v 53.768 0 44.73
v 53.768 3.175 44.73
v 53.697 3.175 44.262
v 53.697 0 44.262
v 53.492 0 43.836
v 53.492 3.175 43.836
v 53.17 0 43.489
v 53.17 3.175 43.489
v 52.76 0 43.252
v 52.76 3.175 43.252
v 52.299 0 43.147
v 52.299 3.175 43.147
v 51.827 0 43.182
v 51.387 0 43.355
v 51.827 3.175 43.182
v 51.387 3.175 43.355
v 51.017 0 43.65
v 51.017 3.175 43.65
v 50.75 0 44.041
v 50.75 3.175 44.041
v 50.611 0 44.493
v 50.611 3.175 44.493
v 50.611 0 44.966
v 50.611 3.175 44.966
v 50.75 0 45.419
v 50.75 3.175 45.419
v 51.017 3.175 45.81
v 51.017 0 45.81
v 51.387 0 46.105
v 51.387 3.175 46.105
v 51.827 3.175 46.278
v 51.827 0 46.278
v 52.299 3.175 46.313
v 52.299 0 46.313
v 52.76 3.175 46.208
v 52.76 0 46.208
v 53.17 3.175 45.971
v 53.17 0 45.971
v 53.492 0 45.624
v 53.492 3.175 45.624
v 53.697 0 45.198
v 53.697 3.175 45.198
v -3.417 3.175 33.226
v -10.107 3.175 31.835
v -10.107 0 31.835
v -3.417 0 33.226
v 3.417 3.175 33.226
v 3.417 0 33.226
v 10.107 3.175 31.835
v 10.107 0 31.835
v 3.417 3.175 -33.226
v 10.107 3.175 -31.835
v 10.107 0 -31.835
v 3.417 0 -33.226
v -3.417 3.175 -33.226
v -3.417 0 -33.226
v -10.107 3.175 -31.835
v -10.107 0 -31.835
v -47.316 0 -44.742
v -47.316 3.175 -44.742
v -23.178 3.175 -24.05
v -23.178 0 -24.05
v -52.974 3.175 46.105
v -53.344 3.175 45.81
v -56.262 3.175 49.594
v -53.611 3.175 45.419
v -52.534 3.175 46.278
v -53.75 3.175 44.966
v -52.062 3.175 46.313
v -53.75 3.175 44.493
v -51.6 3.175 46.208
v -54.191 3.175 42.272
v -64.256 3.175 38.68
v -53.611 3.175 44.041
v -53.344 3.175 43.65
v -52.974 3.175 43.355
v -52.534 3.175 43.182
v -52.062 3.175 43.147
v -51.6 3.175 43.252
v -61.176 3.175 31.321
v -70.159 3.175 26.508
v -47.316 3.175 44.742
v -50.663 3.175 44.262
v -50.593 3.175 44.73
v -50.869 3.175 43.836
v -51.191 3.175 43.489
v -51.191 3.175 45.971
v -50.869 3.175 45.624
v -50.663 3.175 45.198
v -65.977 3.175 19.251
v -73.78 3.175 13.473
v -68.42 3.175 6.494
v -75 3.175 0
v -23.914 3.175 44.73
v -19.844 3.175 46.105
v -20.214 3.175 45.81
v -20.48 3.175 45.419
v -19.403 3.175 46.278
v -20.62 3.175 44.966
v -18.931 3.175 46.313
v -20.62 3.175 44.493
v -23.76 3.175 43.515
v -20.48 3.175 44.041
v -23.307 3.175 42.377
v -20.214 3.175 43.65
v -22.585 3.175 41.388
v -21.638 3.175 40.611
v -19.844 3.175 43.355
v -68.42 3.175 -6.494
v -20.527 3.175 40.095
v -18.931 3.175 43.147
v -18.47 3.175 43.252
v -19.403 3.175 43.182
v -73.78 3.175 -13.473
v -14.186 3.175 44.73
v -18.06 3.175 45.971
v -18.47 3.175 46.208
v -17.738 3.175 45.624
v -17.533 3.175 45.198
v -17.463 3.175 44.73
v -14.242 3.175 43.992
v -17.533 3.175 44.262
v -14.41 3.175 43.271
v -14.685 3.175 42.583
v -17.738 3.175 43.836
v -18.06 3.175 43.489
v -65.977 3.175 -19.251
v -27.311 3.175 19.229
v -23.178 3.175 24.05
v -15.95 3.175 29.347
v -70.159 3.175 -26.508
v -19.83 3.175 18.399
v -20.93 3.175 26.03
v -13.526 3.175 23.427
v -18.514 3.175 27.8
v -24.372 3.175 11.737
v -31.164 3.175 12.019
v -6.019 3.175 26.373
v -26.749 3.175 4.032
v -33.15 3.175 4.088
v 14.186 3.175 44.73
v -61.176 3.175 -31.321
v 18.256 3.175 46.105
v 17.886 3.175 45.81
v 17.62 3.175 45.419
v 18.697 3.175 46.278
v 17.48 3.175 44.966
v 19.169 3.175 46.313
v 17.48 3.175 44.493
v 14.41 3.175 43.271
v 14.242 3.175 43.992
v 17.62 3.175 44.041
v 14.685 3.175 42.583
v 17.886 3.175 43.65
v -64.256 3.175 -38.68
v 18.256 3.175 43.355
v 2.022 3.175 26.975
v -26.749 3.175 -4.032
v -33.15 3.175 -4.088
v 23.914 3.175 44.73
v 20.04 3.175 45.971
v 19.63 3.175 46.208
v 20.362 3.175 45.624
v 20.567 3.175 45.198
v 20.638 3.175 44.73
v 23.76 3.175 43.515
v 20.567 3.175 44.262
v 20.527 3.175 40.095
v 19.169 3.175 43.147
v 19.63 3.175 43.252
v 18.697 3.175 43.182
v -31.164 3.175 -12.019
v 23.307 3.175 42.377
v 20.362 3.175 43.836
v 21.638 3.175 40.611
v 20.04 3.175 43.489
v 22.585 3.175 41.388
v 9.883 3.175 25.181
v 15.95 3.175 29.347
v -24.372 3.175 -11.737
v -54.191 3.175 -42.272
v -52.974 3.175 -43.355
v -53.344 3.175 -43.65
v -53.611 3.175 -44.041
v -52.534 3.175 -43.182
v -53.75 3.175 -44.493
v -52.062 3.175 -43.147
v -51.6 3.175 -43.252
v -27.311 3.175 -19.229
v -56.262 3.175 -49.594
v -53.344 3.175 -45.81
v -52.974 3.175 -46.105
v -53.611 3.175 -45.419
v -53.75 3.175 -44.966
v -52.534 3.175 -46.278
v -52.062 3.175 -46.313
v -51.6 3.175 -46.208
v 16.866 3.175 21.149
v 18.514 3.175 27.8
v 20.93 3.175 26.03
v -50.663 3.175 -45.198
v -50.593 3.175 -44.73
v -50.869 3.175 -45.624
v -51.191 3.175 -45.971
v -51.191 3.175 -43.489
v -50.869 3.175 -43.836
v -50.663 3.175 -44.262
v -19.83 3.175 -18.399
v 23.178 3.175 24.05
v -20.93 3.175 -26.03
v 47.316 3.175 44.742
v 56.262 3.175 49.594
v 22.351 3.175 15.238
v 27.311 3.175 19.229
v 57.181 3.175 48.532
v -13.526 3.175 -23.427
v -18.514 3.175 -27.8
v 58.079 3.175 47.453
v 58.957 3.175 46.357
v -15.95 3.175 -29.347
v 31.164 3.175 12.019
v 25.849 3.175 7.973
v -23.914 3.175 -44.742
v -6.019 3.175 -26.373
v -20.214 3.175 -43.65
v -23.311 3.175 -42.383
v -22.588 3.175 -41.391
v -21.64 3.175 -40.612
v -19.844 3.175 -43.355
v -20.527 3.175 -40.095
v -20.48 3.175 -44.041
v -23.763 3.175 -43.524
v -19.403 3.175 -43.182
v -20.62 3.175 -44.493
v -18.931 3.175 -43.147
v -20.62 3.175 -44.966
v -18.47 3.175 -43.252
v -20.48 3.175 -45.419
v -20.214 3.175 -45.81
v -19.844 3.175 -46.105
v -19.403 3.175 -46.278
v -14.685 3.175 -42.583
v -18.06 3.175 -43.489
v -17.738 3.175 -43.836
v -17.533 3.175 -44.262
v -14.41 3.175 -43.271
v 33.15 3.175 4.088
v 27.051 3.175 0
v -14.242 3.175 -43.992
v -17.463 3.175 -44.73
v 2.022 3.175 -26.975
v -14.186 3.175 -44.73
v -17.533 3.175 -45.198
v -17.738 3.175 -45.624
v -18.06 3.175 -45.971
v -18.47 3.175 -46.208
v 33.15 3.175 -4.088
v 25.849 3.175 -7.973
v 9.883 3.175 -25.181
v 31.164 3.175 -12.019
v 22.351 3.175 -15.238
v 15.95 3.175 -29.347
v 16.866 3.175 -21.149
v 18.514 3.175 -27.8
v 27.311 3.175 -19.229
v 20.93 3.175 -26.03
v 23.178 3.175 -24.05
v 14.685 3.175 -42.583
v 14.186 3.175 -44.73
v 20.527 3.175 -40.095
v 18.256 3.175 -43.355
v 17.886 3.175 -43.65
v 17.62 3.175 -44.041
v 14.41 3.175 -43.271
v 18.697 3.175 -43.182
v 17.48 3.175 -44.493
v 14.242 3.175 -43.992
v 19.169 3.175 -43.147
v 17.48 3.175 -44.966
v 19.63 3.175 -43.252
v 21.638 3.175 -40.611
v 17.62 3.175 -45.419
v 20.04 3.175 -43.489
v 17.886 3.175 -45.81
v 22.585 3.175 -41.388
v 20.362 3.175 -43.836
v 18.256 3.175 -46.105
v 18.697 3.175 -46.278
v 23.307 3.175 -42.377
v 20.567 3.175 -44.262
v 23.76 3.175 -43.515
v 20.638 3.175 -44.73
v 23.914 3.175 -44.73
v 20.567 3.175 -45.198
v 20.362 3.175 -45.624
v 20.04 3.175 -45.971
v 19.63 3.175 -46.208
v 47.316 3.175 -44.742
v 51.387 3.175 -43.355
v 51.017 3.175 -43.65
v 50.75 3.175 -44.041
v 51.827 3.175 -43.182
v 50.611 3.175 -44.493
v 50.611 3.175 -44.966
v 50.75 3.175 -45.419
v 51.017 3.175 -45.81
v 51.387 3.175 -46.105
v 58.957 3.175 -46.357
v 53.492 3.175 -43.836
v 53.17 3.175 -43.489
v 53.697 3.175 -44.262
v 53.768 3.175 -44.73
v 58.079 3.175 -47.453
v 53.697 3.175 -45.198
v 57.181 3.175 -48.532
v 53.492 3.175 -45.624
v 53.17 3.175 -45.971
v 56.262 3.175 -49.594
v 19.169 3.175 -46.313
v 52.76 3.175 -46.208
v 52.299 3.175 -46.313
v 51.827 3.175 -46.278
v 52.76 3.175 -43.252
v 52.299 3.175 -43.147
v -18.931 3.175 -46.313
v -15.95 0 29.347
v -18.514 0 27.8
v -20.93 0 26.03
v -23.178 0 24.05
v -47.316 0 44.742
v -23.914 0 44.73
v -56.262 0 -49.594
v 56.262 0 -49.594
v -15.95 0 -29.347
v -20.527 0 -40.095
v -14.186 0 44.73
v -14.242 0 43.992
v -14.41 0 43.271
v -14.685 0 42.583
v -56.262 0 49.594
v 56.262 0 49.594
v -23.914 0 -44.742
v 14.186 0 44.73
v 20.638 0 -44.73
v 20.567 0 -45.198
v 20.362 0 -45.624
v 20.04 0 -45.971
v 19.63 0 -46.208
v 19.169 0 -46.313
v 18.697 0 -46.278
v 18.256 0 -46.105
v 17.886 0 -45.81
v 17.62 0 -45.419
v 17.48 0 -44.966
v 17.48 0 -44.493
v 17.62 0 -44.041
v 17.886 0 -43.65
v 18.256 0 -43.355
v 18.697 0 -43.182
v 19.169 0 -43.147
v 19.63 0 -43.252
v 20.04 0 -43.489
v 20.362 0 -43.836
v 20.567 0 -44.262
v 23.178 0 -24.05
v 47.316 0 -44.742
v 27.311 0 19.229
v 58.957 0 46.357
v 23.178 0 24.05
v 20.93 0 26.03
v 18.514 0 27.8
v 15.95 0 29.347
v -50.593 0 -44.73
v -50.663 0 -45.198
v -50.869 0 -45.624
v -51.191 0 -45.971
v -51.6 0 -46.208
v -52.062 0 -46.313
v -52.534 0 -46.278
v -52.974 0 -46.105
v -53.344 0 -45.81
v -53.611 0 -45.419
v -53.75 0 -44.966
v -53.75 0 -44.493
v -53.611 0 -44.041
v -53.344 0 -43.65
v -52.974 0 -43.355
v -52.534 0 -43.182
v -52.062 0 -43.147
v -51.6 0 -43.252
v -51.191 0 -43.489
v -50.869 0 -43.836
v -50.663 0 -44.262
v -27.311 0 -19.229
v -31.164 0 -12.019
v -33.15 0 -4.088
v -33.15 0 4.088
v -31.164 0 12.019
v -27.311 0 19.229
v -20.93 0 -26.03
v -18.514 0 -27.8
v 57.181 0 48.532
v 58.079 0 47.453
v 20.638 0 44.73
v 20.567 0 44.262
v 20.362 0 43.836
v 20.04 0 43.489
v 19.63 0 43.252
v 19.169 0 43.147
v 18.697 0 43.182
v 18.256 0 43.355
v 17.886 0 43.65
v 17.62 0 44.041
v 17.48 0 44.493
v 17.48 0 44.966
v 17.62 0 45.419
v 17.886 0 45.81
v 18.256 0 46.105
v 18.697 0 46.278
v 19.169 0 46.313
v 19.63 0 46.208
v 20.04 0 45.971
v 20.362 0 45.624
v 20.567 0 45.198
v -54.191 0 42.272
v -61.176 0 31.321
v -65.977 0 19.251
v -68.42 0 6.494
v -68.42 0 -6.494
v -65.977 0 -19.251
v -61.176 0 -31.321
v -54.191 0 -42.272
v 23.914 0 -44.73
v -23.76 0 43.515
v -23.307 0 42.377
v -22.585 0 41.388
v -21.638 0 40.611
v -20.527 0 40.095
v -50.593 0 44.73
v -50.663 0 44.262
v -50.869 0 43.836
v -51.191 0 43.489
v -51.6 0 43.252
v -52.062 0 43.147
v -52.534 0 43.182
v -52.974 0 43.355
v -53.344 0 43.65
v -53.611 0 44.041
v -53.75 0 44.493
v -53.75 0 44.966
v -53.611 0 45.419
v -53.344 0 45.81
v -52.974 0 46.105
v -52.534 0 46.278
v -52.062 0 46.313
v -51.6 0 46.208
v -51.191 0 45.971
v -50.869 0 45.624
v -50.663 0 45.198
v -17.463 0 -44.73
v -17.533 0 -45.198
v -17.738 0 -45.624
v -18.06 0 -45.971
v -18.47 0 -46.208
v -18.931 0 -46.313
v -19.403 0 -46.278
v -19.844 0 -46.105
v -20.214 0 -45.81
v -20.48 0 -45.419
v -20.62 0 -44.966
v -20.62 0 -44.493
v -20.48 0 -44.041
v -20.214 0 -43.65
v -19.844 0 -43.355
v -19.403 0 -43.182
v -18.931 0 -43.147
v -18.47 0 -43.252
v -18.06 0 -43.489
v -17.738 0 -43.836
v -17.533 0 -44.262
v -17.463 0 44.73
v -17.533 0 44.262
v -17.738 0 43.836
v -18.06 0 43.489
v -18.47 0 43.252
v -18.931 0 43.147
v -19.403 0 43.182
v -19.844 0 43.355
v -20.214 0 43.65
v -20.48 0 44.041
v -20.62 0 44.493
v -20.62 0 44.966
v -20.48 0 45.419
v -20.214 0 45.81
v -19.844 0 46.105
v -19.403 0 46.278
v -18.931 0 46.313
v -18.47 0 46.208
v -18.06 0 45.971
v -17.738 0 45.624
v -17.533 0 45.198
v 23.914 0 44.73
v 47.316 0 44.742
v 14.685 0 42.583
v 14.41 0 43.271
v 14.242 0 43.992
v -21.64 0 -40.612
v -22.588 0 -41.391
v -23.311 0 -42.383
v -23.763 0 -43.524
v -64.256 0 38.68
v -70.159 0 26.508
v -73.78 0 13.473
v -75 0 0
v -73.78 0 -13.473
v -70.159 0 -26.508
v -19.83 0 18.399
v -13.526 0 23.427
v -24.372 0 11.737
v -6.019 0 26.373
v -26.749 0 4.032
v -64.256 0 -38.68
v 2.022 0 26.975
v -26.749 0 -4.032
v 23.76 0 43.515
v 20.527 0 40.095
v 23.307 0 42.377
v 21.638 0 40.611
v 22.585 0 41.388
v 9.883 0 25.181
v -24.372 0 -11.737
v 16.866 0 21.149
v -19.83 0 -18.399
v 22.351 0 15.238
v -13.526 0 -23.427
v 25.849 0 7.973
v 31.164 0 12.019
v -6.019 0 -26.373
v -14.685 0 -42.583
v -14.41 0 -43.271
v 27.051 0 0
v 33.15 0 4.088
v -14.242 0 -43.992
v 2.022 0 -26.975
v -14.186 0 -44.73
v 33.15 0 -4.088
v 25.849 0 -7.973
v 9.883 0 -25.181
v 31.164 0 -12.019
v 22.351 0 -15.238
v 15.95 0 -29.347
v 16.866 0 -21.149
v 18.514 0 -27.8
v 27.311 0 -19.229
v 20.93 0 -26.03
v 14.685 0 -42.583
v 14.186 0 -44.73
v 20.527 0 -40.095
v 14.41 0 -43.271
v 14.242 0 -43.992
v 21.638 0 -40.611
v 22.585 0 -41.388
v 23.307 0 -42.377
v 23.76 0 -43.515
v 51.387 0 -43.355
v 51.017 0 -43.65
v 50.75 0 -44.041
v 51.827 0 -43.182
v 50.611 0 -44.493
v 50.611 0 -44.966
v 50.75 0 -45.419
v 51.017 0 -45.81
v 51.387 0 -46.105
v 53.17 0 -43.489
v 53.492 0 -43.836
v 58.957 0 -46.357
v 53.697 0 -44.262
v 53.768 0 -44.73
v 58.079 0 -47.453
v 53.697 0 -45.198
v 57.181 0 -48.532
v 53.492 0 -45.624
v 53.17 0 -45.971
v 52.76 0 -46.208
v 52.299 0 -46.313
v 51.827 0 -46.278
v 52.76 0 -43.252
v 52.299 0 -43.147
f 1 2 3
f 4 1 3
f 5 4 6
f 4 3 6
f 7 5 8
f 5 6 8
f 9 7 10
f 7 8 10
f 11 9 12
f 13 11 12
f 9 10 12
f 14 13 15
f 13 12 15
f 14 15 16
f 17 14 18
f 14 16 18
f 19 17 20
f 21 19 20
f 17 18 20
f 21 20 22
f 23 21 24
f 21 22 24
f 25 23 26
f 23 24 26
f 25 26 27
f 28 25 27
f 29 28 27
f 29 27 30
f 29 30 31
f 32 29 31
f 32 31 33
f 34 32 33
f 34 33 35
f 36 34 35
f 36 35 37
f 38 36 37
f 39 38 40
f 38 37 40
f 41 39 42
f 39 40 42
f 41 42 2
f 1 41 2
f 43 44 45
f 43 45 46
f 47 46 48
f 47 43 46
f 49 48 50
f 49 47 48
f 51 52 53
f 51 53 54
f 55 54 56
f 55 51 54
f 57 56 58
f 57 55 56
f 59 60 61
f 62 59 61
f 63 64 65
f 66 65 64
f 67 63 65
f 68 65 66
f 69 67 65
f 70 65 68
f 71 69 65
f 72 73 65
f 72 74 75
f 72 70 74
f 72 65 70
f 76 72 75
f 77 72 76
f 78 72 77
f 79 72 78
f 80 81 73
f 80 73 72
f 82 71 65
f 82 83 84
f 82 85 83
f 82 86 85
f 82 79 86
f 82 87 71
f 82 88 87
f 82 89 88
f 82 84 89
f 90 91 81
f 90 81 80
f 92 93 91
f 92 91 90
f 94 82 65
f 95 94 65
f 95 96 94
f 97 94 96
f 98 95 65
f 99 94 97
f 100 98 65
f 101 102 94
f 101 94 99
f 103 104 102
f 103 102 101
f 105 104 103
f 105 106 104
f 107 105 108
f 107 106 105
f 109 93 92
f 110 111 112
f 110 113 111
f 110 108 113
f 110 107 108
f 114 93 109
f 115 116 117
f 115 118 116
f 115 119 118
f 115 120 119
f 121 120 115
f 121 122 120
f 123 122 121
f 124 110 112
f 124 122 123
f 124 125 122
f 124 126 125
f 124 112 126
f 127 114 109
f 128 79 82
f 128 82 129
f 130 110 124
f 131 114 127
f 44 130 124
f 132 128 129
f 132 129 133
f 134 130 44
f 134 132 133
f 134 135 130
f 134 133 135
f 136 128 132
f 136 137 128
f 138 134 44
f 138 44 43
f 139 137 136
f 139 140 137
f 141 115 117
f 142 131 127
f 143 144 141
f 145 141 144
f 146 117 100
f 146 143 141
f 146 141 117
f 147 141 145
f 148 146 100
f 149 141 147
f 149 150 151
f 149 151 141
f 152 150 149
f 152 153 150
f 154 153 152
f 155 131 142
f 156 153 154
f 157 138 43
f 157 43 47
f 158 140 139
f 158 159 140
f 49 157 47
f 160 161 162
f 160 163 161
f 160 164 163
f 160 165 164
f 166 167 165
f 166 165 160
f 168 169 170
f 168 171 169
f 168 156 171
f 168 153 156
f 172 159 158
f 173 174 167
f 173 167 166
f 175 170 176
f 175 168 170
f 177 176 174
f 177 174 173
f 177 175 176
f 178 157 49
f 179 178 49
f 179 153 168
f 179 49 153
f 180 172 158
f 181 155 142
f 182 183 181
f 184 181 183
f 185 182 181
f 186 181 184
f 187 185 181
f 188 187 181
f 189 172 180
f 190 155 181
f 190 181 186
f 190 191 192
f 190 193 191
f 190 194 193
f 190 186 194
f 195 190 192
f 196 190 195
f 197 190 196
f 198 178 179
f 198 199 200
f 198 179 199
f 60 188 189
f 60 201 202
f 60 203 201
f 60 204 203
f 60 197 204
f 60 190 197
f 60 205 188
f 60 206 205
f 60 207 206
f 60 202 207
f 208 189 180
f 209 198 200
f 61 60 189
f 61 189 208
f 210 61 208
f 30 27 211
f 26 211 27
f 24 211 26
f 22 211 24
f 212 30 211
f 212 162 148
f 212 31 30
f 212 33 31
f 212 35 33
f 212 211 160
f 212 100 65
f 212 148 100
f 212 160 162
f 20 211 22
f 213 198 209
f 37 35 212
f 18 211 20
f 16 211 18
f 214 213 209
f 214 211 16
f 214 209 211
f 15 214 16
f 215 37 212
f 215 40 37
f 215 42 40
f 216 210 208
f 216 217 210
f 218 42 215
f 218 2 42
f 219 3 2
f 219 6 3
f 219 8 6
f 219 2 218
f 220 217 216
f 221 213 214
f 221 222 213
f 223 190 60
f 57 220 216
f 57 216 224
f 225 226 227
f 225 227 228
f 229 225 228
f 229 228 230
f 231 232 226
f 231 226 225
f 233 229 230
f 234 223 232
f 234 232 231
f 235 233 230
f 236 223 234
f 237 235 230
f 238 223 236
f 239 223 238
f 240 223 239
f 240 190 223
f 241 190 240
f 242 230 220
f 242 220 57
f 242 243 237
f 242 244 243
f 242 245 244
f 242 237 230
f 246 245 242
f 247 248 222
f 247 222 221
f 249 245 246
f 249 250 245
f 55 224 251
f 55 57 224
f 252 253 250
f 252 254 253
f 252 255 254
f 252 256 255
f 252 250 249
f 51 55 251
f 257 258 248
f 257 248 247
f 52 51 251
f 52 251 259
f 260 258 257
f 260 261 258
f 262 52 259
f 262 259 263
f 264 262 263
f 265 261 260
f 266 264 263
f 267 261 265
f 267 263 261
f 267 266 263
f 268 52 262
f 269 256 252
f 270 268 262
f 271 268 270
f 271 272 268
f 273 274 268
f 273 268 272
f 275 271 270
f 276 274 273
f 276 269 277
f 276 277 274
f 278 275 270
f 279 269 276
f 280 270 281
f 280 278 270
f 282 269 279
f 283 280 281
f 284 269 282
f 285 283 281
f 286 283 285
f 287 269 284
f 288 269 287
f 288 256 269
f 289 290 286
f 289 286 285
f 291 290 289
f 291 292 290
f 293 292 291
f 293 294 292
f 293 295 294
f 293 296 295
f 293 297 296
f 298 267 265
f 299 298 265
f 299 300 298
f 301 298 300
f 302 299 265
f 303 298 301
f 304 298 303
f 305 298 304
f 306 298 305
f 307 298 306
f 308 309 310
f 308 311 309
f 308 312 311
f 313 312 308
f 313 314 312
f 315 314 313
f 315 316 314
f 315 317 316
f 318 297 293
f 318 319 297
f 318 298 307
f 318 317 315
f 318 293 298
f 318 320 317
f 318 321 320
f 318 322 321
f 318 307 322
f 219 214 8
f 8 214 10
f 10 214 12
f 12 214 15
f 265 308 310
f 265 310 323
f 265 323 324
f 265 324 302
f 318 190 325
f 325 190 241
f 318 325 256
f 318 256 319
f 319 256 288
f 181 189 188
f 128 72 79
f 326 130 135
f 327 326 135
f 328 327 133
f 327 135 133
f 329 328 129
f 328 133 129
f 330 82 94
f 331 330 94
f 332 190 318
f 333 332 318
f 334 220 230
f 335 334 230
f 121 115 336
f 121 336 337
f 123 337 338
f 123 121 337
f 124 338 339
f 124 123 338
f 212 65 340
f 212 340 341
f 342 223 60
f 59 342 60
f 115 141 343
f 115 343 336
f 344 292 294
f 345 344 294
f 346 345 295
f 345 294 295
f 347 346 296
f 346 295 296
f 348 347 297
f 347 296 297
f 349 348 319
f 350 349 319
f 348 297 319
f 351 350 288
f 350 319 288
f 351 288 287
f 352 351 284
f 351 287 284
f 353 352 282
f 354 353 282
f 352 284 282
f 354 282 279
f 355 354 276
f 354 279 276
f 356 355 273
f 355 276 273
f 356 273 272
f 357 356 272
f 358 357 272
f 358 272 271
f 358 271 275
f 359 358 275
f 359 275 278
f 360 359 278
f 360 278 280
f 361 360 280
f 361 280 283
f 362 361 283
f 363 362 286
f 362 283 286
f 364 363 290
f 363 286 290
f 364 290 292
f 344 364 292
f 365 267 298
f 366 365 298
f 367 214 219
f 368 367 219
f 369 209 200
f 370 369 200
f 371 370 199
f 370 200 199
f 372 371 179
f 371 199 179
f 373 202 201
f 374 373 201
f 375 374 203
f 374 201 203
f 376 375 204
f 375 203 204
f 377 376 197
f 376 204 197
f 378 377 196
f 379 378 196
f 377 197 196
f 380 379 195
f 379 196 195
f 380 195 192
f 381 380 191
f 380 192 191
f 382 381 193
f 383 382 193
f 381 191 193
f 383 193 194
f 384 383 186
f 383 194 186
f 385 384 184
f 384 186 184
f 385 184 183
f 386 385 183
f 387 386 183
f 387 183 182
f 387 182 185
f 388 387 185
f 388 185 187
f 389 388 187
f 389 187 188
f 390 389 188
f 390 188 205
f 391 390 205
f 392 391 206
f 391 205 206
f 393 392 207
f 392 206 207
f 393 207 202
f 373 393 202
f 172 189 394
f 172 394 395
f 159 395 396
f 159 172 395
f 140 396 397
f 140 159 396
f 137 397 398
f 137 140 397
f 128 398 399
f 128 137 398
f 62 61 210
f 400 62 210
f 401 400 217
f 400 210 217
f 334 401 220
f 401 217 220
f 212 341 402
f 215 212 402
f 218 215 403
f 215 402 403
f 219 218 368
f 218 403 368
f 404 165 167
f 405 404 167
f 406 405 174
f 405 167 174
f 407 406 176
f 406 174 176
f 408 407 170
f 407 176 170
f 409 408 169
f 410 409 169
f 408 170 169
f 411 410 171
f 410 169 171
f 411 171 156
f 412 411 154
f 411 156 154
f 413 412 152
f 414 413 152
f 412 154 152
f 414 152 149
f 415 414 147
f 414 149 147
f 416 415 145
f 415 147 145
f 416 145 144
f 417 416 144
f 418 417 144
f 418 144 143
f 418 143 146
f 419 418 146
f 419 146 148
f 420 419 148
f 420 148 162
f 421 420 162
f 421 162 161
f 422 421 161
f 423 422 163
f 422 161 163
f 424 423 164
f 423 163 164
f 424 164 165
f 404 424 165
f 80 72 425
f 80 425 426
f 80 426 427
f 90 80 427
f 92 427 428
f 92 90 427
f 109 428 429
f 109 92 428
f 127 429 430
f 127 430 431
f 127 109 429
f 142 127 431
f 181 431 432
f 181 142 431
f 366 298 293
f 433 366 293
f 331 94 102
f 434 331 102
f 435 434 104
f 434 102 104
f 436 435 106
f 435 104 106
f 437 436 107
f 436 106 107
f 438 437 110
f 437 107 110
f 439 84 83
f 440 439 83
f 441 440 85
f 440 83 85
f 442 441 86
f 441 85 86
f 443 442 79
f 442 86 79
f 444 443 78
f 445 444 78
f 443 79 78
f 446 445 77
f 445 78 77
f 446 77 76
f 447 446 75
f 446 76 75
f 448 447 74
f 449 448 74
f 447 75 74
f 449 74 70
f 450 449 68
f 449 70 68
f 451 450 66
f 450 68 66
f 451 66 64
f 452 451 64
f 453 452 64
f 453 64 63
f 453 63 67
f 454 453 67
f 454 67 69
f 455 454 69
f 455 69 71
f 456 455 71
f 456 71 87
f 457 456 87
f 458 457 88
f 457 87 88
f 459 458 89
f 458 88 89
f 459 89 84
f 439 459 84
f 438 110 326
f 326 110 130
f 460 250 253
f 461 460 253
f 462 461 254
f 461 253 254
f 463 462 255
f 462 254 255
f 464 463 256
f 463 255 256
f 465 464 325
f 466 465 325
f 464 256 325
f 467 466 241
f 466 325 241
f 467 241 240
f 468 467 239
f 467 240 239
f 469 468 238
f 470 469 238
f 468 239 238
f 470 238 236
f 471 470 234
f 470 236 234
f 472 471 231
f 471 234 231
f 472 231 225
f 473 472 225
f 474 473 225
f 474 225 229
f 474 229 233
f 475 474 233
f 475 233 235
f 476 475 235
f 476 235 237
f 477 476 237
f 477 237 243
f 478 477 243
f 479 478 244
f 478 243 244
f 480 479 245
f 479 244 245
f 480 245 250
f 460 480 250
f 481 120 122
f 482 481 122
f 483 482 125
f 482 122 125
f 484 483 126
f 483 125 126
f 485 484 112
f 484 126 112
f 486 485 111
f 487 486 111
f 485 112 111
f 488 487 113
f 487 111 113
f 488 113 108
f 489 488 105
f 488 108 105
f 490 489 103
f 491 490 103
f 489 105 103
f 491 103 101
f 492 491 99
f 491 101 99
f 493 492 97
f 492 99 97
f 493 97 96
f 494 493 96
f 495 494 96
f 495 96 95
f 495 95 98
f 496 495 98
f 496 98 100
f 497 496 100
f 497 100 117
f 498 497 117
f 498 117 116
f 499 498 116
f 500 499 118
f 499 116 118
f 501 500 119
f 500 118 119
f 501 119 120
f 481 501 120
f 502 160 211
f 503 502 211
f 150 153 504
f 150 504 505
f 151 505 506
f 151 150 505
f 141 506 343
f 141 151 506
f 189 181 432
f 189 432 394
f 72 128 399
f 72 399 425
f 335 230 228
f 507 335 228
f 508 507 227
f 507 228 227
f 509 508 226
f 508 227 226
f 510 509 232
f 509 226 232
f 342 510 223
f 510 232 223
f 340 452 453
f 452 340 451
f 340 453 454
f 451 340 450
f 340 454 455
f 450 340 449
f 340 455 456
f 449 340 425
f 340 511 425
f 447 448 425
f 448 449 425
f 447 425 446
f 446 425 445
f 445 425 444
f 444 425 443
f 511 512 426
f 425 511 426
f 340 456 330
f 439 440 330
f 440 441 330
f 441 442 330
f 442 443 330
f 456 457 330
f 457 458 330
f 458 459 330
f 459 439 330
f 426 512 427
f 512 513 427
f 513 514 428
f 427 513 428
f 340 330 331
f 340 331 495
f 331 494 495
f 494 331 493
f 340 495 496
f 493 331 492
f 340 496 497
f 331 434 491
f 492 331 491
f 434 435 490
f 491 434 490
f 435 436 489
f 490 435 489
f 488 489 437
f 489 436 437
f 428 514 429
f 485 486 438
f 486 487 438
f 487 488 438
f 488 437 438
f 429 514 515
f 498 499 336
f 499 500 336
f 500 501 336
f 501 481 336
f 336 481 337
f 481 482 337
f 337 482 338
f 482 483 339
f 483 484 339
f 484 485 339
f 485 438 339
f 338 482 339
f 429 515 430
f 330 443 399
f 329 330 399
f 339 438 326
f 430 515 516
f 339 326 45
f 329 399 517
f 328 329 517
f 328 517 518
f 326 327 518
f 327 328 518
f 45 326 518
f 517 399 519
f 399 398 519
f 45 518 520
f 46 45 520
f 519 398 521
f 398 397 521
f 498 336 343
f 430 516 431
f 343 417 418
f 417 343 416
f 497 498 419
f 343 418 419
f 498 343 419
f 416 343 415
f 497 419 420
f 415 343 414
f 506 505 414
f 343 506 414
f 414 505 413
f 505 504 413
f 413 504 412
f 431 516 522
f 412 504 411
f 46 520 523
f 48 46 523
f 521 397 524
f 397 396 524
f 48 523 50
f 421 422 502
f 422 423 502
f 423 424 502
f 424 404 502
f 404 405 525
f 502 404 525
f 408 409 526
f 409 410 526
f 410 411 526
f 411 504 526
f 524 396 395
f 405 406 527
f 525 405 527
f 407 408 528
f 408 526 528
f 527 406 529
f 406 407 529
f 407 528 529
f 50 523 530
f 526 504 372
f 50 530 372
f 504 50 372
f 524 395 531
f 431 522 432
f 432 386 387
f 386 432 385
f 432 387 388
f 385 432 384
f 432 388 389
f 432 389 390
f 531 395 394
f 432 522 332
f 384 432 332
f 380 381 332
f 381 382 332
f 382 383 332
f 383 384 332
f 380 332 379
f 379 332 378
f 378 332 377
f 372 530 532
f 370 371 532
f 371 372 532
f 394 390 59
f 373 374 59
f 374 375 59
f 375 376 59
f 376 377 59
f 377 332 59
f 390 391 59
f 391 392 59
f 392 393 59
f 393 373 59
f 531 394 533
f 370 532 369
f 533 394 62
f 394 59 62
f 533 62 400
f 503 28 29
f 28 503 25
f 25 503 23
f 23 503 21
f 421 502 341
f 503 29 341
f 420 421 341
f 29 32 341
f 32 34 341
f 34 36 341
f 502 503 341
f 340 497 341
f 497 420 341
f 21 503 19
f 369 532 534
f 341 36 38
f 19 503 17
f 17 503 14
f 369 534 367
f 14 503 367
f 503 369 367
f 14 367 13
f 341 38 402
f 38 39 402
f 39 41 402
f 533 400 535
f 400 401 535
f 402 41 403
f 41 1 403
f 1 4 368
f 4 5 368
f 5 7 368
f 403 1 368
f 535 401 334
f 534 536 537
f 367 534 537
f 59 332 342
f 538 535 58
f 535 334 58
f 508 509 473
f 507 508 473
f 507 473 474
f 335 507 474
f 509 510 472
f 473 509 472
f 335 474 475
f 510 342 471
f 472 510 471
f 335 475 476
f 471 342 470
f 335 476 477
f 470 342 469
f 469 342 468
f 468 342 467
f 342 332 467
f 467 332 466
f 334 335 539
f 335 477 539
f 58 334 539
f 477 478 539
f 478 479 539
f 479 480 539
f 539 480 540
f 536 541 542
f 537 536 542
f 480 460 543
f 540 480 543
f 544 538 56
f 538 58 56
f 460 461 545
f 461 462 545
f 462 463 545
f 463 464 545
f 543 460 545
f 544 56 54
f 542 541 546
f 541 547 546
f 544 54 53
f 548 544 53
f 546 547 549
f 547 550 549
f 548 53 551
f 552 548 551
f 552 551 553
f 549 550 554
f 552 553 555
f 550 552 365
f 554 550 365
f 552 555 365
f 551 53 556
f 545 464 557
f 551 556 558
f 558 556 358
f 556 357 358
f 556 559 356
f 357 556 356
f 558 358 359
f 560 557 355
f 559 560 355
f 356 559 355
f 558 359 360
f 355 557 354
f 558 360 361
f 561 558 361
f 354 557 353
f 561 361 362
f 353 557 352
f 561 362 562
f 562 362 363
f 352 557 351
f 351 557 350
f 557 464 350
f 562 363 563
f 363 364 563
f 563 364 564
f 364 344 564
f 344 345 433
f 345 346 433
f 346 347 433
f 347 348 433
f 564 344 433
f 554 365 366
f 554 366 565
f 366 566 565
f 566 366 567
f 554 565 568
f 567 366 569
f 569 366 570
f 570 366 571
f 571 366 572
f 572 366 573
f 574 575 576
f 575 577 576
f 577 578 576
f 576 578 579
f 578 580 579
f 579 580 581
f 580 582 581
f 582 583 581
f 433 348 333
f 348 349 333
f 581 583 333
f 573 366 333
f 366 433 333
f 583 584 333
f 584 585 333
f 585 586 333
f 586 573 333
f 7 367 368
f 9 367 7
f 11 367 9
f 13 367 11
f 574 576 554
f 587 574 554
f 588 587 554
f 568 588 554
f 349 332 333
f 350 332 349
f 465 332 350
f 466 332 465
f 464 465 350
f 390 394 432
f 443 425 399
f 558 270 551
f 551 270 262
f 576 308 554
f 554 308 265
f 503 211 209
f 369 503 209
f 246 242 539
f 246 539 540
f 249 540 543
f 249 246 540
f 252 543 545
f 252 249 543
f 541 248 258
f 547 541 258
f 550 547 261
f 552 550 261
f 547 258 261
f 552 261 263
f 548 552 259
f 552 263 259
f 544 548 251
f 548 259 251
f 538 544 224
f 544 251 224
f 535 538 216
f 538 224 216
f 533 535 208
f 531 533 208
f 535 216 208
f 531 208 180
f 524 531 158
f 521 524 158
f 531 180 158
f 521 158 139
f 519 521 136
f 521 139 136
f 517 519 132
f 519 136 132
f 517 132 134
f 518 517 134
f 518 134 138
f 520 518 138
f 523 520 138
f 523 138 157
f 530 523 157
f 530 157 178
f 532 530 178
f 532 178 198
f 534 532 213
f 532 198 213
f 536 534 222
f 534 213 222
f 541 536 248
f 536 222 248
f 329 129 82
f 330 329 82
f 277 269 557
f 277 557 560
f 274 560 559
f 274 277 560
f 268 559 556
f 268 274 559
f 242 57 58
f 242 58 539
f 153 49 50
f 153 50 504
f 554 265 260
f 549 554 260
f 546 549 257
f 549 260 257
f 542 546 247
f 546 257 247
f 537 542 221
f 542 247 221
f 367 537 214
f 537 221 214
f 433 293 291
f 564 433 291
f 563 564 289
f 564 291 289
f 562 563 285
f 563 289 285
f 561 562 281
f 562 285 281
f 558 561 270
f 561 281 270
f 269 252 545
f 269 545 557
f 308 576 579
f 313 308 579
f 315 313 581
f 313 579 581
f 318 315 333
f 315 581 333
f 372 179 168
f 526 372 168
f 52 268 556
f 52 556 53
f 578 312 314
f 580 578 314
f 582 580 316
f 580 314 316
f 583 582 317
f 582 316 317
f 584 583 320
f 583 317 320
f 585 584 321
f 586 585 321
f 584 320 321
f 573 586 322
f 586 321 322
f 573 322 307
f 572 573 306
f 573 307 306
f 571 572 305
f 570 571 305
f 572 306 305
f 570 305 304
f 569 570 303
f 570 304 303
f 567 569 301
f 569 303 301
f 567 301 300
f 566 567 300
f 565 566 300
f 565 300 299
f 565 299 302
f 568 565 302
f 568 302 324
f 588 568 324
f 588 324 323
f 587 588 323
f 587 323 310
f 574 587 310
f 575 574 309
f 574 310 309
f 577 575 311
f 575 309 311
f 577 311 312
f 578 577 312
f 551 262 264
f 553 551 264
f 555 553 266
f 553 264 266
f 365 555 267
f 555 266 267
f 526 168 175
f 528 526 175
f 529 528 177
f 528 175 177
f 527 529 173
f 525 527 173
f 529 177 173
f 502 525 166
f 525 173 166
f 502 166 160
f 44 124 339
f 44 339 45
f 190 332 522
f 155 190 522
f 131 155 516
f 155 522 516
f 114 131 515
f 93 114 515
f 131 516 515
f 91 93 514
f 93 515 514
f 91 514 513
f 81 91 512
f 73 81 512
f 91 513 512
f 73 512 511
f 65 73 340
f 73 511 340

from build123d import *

# Parameters (mm, degrees)
SKETCH1_R           = 75
BOSS_EXTRUDE1_DEPTH = 3.175
CUT_EXTRUDE1_DEPTH  = 3.175
SKETCH3_R           = 1.5875
CUT_EXTRUDE2_DEPTH  = 3.175
SKETCH4_R           = 27.051
CUT_EXTRUDE3_DEPTH  = 3.175
CUT_EXTRUDE4_DEPTH  = 3.175


with BuildPart() as part:
    # Sketch1 → Boss-Extrude1 (new body)
    with BuildSketch(Plane(origin=(0, 0, 0), x_dir=(1, 0, 0), z_dir=(0, 1, 0))):
        Circle(SKETCH1_R)
    extrude(amount=BOSS_EXTRUDE1_DEPTH)

    # Sketch2 → Cut-Extrude1 (cut)
    with BuildSketch(Plane(origin=(0, 3.175, 0), x_dir=(1, 0, 0), z_dir=(0, 1, 0))):
        with BuildLine():
            Line((-56.262005909, -49.594220339), (56.262005909, -49.594220339))
            ThreePointArc((56.262005909, -49.594220339), (0, -75), (-56.262005909, -49.594220339))
        make_face()
        with BuildLine():
            Line((-56.262005909, 49.594220339), (56.262005909, 49.594220339))
            ThreePointArc((56.262005909, 49.594220339), (0, 75), (-56.262005909, 49.594220339))
        make_face()
    extrude(amount=-CUT_EXTRUDE1_DEPTH, mode=Mode.SUBTRACT)

    # Sketch3 → Cut-Extrude2 (cut)
    with BuildSketch(Plane(origin=(0, 3.175, 0), x_dir=(1, 0, 0), z_dir=(0, 1, 0))):
        with Locations((-52.180304588, 44.729838125)):
            Circle(SKETCH3_R)
        with Locations((-19.05, 44.729838125)):
            Circle(SKETCH3_R)
        with Locations((19.05, 44.729838125)):
            Circle(SKETCH3_R)
        with Locations((52.180304588, 44.729838125)):
            Circle(SKETCH3_R)
        with Locations((52.180304588, -44.729838125)):
            Circle(SKETCH3_R)
        with Locations((19.05, -44.729838125)):
            Circle(SKETCH3_R)
        with Locations((-19.05, -44.729838125)):
            Circle(SKETCH3_R)
        with Locations((-52.180304588, -44.729838125)):
            Circle(SKETCH3_R)
    extrude(amount=-CUT_EXTRUDE2_DEPTH, mode=Mode.SUBTRACT)

    # Sketch4 → Cut-Extrude3 (cut)
    with BuildSketch(Plane(origin=(0, 3.175, 0), x_dir=(1, 0, 0), z_dir=(0, 1, 0))):
        with BuildLine():
            Line((-47.315937317, 44.741895283), (-23.177806764, 24.050282215))
            ThreePointArc((-23.177806764, 24.050282215), (-19.742091457, 26.942097653), (-15.949506316, 29.346891646))
            Line((-15.949506316, 29.346891646), (-20.527078848, 40.095137229))
            ThreePointArc((-20.527078848, 40.095137229), (-22.980849122, 41.864416778), (-23.914367271, 44.741895283))
            Line((-23.914367271, 44.741895283), (-47.315937317, 44.741895283))
        make_face()
        with BuildLine():
            ThreePointArc((10.107278818, 31.835039122), (0, 33.401), (-10.107278818, 31.835039122))
            Line((-10.107278818, 31.835039122), (-14.68485135, 42.583284705))
            ThreePointArc((-14.68485135, 42.583284705), (-14.312069768, 43.627916425), (-14.185617786, 44.729838125))
            Line((-14.185617786, 44.729838125), (14.185617786, 44.729838125))
            ThreePointArc((14.185617786, 44.729838125), (14.312069768, 43.627916425), (14.68485135, 42.583284705))
            Line((14.68485135, 42.583284705), (10.107278818, 31.835039122))
        make_face()
        with BuildLine():
            ThreePointArc((15.949506316, 29.346891646), (19.742091457, 26.942097653), (23.177806764, 24.050282215))
            Line((23.177806764, 24.050282215), (47.315937317, 44.741895283))
            Line((47.315937317, 44.741895283), (23.914382214, 44.729838125))
            ThreePointArc((23.914382214, 44.729838125), (22.977294896, 41.859547352), (20.527078848, 40.095137229))
            Line((20.527078848, 40.095137229), (15.949506316, 29.346891646))
        make_face()
        Circle(SKETCH4_R)
        with BuildLine():
            Line((-23.177806764, -24.050282215), (-47.315937317, -44.741895283))
            Line((-47.315937317, -44.741895283), (-23.914382214, -44.729838125))
            ThreePointArc((-23.914382214, -44.729838125), (-22.977294896, -41.859547352), (-20.527078848, -40.095137229))
            Line((-20.527078848, -40.095137229), (-15.949506316, -29.346891646))
            ThreePointArc((-15.949506316, -29.346891646), (-19.742091457, -26.942097653), (-23.177806764, -24.050282215))
        make_face()
        with BuildLine():
            ThreePointArc((-10.107278818, -31.835039122), (0, -33.401), (10.107278818, -31.835039122))
            Line((10.107278818, -31.835039122), (14.68485135, -42.583284705))
            ThreePointArc((14.68485135, -42.583284705), (14.312069768, -43.627916425), (14.185617786, -44.729838125))
            Line((14.185617786, -44.729838125), (-14.185617786, -44.729838125))
            ThreePointArc((-14.185617786, -44.729838125), (-14.312069768, -43.627916425), (-14.68485135, -42.583284705))
            Line((-14.68485135, -42.583284705), (-10.107278818, -31.835039122))
        make_face()
        with BuildLine():
            ThreePointArc((23.177806764, -24.050282215), (19.742091457, -26.942097653), (15.949506316, -29.346891646))
            Line((15.949506316, -29.346891646), (20.527078848, -40.095137229))
            ThreePointArc((20.527078848, -40.095137229), (22.977294896, -41.859547352), (23.914382214, -44.729838125))
            Line((23.914382214, -44.729838125), (47.315937317, -44.741895283))
            Line((47.315937317, -44.741895283), (23.177806764, -24.050282215))
        make_face()
    extrude(amount=-CUT_EXTRUDE3_DEPTH, mode=Mode.SUBTRACT)

    # Sketch5 → Cut-Extrude4 (cut)
    with BuildSketch(Plane(origin=(0, 3.175, 0), x_dir=(1, 0, 0), z_dir=(0, 1, 0))):
        with BuildLine():
            Line((58.957481542, 46.357473725), (27.31053772, 19.229179141))
            ThreePointArc((27.31053772, 19.229179141), (33.401, 0), (27.31053772, -19.229179141))
            Line((27.31053772, -19.229179141), (58.957481542, -46.357473725))
            ThreePointArc((58.957481542, -46.357473725), (75, 0), (58.957481542, 46.357473725))
        make_face()
        with BuildLine():
            Line((-54.190960711, 42.271531589), (-27.31053772, 19.229179141))
            ThreePointArc((-27.31053772, 19.229179141), (-33.401, 0), (-27.31053772, -19.229179141))
            Line((-27.31053772, -19.229179141), (-54.190960711, -42.271531589))
            ThreePointArc((-54.190960711, -42.271531589), (-68.728033622, 0), (-54.190960711, 42.271531589))
        make_face()
    extrude(amount=-CUT_EXTRUDE4_DEPTH, mode=Mode.SUBTRACT)


solid = part.part
